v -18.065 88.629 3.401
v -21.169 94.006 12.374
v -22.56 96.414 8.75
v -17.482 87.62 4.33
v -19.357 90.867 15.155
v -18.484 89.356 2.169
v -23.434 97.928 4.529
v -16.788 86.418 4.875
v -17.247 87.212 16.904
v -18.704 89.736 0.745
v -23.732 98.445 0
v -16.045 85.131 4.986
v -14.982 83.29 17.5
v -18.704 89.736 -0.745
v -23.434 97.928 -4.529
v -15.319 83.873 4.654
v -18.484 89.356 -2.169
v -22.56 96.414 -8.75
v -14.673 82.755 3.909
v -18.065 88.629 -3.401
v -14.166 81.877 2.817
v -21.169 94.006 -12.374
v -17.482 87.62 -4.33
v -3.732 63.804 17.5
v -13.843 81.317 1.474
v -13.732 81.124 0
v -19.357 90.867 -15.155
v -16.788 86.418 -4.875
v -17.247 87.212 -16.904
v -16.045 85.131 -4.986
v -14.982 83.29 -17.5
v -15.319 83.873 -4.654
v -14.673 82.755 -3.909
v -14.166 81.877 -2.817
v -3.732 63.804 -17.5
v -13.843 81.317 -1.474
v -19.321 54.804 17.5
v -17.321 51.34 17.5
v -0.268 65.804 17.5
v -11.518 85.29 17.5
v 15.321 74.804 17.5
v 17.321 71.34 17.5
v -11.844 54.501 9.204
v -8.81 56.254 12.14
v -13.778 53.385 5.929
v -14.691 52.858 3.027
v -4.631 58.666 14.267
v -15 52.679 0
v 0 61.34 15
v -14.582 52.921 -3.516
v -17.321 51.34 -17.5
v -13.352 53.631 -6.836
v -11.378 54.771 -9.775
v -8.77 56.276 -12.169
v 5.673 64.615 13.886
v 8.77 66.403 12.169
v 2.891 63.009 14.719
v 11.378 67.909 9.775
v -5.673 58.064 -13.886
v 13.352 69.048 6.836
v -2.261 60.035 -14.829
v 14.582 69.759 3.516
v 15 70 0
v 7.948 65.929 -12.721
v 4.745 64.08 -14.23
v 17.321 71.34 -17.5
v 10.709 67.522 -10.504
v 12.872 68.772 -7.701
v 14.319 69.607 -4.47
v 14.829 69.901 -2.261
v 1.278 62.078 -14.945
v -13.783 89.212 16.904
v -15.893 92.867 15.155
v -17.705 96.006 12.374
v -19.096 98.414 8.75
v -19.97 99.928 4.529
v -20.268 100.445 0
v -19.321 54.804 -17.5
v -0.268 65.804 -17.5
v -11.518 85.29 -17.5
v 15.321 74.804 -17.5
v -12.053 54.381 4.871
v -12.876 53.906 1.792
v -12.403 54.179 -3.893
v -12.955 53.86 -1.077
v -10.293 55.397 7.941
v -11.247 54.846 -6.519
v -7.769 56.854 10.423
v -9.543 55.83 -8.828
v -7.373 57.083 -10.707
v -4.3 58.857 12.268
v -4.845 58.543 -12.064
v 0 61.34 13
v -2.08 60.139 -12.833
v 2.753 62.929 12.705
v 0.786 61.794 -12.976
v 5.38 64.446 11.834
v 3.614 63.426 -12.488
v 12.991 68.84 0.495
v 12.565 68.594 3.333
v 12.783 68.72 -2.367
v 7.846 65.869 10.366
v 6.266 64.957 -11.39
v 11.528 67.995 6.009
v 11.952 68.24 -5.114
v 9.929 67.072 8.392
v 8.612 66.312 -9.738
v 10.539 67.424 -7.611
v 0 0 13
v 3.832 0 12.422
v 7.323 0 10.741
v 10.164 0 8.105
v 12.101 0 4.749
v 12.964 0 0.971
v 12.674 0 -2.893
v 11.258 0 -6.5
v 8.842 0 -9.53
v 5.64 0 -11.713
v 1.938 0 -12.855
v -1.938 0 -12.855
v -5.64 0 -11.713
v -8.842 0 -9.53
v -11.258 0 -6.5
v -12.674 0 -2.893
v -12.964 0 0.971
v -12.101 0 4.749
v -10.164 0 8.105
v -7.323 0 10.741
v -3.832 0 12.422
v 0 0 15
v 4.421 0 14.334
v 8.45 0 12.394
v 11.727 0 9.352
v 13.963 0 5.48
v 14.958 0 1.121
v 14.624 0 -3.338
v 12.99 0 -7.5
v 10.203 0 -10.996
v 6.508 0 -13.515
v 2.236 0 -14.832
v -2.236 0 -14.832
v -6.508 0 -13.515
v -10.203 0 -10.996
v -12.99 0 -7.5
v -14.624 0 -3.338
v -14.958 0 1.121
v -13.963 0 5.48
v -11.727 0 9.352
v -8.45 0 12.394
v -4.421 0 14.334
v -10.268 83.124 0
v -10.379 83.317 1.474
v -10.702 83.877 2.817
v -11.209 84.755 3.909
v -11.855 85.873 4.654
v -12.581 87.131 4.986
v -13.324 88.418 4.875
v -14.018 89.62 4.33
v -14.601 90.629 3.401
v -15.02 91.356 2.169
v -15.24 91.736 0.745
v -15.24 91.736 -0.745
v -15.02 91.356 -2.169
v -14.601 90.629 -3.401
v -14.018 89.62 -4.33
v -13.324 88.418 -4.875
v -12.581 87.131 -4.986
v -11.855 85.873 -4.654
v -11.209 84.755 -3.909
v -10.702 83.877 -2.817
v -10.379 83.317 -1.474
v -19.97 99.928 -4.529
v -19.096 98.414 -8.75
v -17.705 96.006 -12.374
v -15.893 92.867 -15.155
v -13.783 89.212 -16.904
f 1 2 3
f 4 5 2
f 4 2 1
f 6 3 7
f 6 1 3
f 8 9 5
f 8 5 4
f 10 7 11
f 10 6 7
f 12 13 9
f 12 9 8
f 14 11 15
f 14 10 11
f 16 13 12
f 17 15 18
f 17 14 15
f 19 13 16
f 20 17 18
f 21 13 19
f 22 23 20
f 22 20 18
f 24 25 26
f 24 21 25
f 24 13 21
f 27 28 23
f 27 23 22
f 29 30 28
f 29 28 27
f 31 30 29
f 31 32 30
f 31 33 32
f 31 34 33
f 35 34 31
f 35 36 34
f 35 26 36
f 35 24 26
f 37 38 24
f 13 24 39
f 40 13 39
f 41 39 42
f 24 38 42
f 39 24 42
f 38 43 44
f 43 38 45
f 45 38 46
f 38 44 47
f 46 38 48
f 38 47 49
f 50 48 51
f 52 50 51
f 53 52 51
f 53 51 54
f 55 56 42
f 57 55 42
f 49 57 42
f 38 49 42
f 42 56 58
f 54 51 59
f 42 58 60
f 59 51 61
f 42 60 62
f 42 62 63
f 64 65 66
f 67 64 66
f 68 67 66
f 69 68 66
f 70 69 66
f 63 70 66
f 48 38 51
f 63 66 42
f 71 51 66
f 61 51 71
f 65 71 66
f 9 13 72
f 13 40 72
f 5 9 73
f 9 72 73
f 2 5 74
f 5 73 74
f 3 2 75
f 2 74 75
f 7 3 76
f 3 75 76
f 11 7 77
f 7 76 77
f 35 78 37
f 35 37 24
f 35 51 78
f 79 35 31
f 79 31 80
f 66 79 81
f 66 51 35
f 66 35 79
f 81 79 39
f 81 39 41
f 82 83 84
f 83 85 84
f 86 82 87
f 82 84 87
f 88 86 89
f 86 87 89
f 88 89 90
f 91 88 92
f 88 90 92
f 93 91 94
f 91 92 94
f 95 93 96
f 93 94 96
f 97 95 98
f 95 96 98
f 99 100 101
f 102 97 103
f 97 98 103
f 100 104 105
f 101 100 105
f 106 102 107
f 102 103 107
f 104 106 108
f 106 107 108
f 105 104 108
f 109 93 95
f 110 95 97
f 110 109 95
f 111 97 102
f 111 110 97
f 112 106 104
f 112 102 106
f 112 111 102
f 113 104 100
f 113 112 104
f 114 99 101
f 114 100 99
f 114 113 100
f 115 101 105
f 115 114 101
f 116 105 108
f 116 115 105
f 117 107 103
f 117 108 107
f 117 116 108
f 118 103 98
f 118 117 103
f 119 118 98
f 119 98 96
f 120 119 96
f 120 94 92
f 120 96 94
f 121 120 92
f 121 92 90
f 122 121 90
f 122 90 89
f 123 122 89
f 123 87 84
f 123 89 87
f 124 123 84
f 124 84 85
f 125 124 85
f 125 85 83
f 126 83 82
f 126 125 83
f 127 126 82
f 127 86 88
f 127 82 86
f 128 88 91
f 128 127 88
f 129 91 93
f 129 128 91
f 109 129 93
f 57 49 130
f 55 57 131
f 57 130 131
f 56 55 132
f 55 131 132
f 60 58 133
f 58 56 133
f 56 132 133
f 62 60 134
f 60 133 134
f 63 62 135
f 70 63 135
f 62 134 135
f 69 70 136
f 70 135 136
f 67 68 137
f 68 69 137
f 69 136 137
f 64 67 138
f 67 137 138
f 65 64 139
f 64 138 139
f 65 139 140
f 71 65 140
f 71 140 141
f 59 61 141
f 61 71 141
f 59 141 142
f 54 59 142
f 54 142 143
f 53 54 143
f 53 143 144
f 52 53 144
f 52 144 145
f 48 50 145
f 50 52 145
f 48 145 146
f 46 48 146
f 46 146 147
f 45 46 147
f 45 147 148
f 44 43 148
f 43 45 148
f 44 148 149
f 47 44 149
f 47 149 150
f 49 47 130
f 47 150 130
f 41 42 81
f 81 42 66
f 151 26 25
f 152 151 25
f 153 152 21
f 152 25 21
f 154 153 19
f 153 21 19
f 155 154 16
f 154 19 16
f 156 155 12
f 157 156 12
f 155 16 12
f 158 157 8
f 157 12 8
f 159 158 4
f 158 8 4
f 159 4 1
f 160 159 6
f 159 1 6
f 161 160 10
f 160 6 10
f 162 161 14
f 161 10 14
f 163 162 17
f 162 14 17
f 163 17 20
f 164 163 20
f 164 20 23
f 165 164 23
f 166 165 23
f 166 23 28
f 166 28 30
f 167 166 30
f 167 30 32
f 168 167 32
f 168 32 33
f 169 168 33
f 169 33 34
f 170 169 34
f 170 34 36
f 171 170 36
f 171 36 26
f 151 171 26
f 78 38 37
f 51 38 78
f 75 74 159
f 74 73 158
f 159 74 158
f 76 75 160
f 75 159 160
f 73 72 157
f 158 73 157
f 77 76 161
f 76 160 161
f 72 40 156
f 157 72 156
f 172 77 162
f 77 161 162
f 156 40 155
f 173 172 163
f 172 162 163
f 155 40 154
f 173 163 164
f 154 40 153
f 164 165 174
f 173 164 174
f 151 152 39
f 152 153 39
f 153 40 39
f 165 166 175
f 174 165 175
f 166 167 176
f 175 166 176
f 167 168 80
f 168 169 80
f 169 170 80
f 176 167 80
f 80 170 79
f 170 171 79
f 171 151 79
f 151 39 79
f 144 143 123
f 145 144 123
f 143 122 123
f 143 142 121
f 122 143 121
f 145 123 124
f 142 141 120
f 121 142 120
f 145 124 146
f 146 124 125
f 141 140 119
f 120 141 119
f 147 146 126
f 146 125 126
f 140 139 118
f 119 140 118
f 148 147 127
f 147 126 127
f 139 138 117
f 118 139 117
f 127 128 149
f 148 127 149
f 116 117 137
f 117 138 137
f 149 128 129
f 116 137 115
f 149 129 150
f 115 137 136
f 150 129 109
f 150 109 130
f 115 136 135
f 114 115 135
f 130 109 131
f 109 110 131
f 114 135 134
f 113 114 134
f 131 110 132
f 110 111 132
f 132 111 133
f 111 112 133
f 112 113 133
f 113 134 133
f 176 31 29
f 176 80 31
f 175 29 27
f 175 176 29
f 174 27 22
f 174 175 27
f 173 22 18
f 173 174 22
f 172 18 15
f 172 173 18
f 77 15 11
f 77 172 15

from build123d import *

# Parameters (mm, degrees)
SKETCH2_R               = 15
SKETCH2_R_2             = 13
BOSS_EXTRUDE1_DEPTH     = 70
CUT_EXTRUDE1_DEPTH      = 74.143694192
CUT_EXTRUDE1_DEPTH_BACK = 74.143694192
SKETCH4_W               = 40
SKETCH4_H               = 35
BOSS_EXTRUDE2_DEPTH     = 4
SKETCH5_W               = 4
SKETCH5_H               = 35
BOSS_EXTRUDE4_DEPTH     = 40
SKETCH6_R               = 5
CUT_EXTRUDE2_DEPTH      = 101.39586407
FILLET3_R               = 17.5


with BuildPart() as part:
    # Sketch2 → Boss-Extrude1 (new body)
    with BuildSketch(Plane(origin=(0, 0, 0), x_dir=(1, 0, 0), z_dir=(0, 1, 0))):
        with Locations(Location((0, 0, 0), (0, 0, 270))):
            Circle(SKETCH2_R)
        with Locations(Location((0, 0, 0), (0, 0, 270))):
            Circle(SKETCH2_R_2, mode=Mode.SUBTRACT)
    extrude(amount=BOSS_EXTRUDE1_DEPTH)

    # Sketch3 → Cut-Extrude1 (cut, two sides: drawn at the far end of the back side and taken through both)
    with BuildSketch(Plane.XY.offset(-CUT_EXTRUDE1_DEPTH_BACK)):
        Polygon((-15, 52.679491924), (-15, 70), (15, 70), align=None)
    extrude(amount=CUT_EXTRUDE1_DEPTH + CUT_EXTRUDE1_DEPTH_BACK, mode=Mode.SUBTRACT)

    # Sketch4 → Boss-Extrude2 (add)
    with BuildSketch(Plane(origin=(-26.560889132, 46.004809472, 0), x_dir=(0.866025403784438, 0.5000000000000012, 0), z_dir=(-0.5000000000000012, 0.866025403784438, 0))):
        with Locations((30.669872981, 0)):
            Rectangle(SKETCH4_W, SKETCH4_H)
    extrude(amount=BOSS_EXTRUDE2_DEPTH)

    # Sketch5 → Boss-Extrude4 (add)
    with BuildSketch(Plane(origin=(-28.560889132, 49.468911087, 0), x_dir=(0.866025403784438, 0.5000000000000012, 0), z_dir=(-0.5000000000000011, 0.8660254037844379, 0))):
        with Locations((30.669872981, 0)):
            Rectangle(SKETCH5_W, SKETCH5_H)
    extrude(amount=BOSS_EXTRUDE4_DEPTH)

    # Sketch6 → Cut-Extrude2 (cut, through all)
    with BuildSketch(Plane(origin=(24.828838325, 14.334936491, 0), x_dir=(0, 0, 1), z_dir=(-0.8660254037844382, -0.5000000000000011, 0))):
        with Locations(Location((0, 82.121778265, 0), (0, 0, 270))):
            Circle(SKETCH6_R)
    extrude(amount=-CUT_EXTRUDE2_DEPTH, mode=Mode.SUBTRACT)

    # Fillet3
    fillet3_edges = [part.edges().sort_by_distance(p)[0] for p in [
        (-22, 99.444863729, 17.5),
        (-22, 99.444863729, -17.5),
    ]]
    fillet(fillet3_edges, radius=FILLET3_R - 0.0001)  # a hair under: the kernel refuses the full size


solid = part.part
